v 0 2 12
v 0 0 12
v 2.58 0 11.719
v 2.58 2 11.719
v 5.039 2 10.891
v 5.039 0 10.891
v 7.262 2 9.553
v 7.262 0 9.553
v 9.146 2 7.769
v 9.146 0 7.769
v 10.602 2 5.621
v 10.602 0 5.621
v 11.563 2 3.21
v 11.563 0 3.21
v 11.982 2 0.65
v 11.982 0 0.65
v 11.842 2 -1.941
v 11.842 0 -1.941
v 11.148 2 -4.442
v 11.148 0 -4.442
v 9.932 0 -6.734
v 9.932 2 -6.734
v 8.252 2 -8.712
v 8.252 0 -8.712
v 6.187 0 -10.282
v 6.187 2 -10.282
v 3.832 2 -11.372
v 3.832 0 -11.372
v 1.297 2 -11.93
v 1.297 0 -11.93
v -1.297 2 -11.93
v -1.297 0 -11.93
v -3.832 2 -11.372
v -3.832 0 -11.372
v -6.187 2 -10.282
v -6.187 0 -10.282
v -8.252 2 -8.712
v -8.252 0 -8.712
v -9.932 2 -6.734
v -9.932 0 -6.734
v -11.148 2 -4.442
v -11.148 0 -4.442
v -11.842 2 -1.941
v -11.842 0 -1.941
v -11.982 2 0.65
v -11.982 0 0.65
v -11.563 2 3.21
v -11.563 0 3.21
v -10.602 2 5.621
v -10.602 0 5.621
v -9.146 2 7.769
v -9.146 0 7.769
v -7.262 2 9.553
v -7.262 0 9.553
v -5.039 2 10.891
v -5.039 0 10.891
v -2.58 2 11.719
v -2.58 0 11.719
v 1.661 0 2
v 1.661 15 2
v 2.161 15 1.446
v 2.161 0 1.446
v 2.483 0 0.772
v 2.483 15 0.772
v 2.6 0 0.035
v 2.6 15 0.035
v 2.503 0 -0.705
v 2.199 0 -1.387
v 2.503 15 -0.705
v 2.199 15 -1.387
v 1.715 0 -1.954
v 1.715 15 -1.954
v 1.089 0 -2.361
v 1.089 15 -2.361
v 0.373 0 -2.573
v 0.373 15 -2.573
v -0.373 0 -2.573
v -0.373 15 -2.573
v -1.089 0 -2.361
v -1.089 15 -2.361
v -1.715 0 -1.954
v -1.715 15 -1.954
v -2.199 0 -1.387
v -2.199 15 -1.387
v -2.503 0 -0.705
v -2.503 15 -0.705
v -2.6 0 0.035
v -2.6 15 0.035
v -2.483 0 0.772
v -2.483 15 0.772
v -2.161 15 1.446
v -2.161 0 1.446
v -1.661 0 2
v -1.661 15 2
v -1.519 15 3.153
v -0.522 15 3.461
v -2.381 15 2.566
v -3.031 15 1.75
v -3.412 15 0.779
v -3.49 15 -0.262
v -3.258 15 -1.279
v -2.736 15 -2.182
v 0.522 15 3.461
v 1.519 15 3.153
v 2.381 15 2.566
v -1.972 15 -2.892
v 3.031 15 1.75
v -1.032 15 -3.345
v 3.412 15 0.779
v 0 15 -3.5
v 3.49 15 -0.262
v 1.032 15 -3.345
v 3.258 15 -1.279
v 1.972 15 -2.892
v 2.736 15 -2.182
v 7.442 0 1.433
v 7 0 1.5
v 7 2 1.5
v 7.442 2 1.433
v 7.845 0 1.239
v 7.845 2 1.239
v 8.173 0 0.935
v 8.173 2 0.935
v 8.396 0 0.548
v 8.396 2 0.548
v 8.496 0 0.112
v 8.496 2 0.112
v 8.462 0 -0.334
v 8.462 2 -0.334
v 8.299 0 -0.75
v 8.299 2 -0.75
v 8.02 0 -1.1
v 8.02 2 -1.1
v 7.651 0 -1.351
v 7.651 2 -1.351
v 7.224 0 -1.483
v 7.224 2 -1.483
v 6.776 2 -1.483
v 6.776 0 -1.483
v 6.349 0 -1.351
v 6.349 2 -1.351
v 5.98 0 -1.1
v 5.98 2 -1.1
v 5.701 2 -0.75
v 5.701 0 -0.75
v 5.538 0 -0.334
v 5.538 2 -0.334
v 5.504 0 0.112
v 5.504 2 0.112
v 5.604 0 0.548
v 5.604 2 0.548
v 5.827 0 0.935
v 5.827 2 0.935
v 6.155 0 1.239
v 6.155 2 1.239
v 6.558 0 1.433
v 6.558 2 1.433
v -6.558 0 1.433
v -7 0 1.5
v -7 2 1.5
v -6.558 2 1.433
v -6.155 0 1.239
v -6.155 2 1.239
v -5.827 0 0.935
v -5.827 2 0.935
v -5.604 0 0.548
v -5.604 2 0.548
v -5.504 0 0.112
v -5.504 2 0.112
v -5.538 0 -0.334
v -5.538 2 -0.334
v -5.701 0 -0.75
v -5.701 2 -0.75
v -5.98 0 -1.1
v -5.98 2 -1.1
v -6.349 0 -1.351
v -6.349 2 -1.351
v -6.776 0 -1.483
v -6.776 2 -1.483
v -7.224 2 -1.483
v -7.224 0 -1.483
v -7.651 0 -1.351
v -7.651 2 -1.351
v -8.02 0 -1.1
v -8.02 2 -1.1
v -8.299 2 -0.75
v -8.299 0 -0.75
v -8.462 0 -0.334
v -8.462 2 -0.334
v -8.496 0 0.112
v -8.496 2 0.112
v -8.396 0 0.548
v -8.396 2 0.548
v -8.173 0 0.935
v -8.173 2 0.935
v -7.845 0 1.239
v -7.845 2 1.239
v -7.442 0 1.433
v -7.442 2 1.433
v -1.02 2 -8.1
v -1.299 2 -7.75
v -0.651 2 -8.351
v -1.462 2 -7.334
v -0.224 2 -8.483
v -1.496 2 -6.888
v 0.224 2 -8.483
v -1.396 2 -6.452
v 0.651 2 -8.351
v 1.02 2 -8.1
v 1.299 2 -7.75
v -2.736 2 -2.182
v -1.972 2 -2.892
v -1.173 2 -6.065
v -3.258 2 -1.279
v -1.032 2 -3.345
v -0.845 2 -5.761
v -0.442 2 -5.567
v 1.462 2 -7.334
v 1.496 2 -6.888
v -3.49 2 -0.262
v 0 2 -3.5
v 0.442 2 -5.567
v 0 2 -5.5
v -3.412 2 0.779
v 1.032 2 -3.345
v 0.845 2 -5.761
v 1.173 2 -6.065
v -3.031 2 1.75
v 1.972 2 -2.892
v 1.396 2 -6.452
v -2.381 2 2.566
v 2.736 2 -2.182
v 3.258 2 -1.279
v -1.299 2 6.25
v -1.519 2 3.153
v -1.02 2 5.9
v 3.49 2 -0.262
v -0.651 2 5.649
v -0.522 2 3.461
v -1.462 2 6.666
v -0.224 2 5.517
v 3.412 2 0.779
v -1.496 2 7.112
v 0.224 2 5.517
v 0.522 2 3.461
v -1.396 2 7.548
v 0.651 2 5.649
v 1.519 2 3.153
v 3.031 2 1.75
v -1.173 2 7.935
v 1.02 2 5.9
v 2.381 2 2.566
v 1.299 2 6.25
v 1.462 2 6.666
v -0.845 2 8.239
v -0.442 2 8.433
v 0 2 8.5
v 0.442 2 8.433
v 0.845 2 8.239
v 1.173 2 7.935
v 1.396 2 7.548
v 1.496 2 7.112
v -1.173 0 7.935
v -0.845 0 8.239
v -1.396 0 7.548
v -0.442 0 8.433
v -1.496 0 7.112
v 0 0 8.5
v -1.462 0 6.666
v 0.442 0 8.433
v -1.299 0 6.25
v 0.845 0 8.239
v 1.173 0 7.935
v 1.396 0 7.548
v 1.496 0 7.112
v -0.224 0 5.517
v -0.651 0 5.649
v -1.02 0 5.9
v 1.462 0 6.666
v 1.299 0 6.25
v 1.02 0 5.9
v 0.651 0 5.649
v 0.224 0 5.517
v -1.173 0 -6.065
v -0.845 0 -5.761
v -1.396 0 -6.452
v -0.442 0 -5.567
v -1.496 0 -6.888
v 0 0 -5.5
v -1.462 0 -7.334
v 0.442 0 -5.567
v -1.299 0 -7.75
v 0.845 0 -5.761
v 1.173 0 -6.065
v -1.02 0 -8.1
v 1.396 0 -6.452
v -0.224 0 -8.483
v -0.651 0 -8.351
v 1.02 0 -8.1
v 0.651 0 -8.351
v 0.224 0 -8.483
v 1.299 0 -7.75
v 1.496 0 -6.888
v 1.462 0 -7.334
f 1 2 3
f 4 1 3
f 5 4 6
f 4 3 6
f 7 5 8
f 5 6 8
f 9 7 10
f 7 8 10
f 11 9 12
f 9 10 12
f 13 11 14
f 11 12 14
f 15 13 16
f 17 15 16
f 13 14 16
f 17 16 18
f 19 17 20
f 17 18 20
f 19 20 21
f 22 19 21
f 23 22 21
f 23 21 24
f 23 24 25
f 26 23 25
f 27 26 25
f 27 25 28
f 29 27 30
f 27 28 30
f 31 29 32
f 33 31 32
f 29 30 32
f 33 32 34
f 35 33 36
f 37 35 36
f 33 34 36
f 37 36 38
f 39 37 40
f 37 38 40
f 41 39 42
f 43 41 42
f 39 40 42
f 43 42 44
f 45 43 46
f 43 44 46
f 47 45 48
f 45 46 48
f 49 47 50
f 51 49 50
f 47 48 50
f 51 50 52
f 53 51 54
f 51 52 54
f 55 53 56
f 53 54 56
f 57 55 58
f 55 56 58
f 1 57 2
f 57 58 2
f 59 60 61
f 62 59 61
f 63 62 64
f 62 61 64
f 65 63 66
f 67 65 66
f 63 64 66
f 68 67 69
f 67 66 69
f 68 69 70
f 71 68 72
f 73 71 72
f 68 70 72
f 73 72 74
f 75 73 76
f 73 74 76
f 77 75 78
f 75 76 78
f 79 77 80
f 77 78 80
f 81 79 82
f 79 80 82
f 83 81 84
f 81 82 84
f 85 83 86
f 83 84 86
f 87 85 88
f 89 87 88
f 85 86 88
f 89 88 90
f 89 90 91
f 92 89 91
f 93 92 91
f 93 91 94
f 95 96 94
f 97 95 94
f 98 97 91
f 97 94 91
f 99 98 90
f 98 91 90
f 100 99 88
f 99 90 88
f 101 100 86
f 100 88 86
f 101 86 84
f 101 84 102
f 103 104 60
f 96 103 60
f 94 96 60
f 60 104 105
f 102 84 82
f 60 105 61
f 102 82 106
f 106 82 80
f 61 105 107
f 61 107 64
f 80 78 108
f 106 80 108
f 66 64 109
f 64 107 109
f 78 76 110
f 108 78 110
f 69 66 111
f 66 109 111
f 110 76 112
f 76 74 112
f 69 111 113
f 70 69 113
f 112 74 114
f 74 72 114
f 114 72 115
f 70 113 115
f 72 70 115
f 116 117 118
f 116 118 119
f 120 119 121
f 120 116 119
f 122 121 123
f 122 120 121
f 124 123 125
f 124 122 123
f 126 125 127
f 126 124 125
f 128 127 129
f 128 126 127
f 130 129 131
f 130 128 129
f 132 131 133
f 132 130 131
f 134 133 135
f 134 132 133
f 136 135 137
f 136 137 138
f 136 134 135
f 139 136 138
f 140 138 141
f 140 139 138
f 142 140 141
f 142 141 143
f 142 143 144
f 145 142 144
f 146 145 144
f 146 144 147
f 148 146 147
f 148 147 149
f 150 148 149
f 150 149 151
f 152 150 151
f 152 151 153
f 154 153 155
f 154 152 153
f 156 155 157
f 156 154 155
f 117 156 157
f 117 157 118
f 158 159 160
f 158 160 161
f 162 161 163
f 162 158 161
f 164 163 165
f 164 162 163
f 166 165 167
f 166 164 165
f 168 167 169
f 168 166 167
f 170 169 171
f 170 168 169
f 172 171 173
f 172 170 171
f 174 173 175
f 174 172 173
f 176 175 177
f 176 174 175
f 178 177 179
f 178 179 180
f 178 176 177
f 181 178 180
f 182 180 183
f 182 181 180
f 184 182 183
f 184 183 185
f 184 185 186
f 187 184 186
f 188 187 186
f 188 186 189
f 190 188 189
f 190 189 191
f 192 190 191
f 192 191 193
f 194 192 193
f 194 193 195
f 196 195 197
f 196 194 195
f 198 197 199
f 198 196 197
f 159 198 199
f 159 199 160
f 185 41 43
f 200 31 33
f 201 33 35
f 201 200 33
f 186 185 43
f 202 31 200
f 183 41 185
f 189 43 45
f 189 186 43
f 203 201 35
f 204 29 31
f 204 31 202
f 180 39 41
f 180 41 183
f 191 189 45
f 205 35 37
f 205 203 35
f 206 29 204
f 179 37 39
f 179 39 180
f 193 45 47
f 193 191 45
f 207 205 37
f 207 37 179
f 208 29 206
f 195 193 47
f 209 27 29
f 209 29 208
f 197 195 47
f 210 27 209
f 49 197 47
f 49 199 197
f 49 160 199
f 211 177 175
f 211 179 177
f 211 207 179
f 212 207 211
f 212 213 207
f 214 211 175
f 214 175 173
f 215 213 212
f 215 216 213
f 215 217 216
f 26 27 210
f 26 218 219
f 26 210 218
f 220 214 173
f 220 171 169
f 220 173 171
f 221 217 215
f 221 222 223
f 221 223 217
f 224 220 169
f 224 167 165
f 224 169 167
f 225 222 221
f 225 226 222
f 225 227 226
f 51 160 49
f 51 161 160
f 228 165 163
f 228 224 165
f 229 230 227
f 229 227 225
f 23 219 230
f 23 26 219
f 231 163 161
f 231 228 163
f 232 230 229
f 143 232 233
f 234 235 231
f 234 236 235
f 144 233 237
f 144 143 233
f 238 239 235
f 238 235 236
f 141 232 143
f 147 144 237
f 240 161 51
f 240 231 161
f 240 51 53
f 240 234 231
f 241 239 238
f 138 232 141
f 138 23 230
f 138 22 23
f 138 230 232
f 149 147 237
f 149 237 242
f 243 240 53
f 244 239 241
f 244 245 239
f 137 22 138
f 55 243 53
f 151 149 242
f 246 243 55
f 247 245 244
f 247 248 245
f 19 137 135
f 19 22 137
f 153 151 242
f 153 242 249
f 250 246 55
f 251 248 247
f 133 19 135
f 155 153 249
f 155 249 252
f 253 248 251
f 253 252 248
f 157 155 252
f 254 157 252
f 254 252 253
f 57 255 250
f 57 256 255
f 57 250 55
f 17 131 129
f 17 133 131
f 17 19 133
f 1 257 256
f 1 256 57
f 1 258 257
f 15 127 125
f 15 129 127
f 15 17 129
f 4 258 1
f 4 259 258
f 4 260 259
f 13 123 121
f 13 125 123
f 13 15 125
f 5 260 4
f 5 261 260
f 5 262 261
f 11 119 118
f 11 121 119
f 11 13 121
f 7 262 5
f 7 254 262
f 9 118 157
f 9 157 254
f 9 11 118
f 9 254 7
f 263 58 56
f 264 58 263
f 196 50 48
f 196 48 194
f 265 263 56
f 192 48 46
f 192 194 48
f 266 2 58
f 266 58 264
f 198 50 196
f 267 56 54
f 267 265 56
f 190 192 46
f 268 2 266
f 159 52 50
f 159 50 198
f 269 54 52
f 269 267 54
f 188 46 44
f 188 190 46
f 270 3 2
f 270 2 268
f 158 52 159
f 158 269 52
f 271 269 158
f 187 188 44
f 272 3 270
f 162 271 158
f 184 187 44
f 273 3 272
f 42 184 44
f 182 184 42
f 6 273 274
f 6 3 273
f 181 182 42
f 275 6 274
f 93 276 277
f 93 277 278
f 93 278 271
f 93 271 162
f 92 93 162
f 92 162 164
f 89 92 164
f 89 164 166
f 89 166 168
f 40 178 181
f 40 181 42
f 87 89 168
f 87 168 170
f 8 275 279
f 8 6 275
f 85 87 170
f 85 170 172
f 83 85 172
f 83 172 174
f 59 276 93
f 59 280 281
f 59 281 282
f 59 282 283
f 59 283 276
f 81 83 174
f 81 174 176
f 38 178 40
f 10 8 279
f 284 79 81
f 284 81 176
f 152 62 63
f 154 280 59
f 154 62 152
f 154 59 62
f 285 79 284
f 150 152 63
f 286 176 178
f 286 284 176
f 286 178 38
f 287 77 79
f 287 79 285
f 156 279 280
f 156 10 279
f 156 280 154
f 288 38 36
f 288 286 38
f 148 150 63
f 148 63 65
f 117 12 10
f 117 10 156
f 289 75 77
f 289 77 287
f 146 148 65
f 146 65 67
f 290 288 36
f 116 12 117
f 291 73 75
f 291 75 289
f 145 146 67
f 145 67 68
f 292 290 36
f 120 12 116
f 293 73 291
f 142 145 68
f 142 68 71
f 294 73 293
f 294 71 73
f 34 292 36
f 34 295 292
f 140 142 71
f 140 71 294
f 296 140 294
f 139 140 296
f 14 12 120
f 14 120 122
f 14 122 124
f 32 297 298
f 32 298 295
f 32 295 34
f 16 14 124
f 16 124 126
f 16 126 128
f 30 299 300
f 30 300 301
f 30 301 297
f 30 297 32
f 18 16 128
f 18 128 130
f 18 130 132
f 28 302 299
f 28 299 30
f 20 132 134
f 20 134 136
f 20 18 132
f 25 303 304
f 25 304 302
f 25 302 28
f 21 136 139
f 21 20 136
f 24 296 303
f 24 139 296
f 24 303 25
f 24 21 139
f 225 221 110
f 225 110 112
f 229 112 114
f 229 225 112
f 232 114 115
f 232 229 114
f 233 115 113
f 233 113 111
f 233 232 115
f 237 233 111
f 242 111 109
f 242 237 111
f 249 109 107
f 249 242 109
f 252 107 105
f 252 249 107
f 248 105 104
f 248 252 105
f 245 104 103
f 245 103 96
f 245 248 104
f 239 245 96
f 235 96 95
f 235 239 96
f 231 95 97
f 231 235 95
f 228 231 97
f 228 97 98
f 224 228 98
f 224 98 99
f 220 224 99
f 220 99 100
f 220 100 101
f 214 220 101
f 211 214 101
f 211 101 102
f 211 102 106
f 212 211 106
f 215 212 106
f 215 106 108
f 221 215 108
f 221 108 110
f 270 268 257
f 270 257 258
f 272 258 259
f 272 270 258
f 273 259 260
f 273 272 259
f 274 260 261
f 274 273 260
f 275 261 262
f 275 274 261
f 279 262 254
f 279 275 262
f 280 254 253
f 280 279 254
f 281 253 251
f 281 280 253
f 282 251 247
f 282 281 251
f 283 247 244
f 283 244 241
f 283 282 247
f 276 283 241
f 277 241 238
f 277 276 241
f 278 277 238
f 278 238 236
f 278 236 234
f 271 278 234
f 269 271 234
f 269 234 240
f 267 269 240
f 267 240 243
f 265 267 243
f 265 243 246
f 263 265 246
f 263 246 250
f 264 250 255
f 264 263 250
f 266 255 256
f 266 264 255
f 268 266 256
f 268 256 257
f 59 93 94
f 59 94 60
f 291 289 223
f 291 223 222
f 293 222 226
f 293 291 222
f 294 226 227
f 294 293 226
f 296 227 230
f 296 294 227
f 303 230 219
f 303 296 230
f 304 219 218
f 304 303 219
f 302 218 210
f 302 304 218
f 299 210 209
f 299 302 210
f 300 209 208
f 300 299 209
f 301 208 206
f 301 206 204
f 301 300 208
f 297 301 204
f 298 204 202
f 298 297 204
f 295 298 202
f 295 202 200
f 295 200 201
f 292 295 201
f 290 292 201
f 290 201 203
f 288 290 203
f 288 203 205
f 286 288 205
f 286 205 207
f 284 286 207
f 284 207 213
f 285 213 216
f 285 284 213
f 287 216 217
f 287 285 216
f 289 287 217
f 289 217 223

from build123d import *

# Parameters (mm, degrees)
SKETCH_2_R          = 12
SKETCH_2_R_2        = 1.5
EXTRUDE_1_DEPTH     = 2
SKETCH_3_R          = 3.5
EXTRUDE_2_DEPTH     = 15
CUT_EXTRUDE_1_DEPTH = 22.377558326


with BuildPart() as part:
    # 草图2 → 凸台-拉伸1 (new body)
    with BuildSketch(Plane(origin=(0, 0, 0), x_dir=(1, 0, 0), z_dir=(0, 1, 0))):
        with Locations(Location((0, 0, 0), (0, 0, 270))):
            Circle(SKETCH_2_R)
        with Locations(Location((0, 7, 0), (0, 0, 270))):
            Circle(SKETCH_2_R_2, mode=Mode.SUBTRACT)
        with Locations(Location((7, 0, 0), (0, 0, 270))):
            Circle(SKETCH_2_R_2, mode=Mode.SUBTRACT)
        with Locations(Location((0, -7, 0), (0, 0, 270))):
            Circle(SKETCH_2_R_2, mode=Mode.SUBTRACT)
        with Locations(Location((-7, 0, 0), (0, 0, 270))):
            Circle(SKETCH_2_R_2, mode=Mode.SUBTRACT)
    extrude(amount=EXTRUDE_1_DEPTH)

    # 草图3 → 凸台-拉伸2 (add)
    with BuildSketch(Plane.XZ):
        with Locations(Location((0, 0, 0), (0, 0, 270))):
            Circle(SKETCH_3_R)
        with BuildLine():
            Line((-1.661324773, 2), (1.661324773, 2))
            ThreePointArc((1.661324773, 2), (0, -2.6), (-1.661324773, 2))
        make_face(mode=Mode.SUBTRACT)
    extrude(amount=-EXTRUDE_2_DEPTH)

    # 草图4 → 切除-拉伸1 (cut, through all)
    with BuildSketch(Plane(origin=(0, 2, 0), x_dir=(1, 0, 0), z_dir=(0, 1, 0))):
        with BuildLine():
            Line((-1.661324773, -2), (1.661324773, -2))
            ThreePointArc((1.661324773, -2), (0, 2.6), (-1.661324773, -2))
        make_face()
    extrude(amount=-CUT_EXTRUDE_1_DEPTH, mode=Mode.SUBTRACT)


solid = part.part
